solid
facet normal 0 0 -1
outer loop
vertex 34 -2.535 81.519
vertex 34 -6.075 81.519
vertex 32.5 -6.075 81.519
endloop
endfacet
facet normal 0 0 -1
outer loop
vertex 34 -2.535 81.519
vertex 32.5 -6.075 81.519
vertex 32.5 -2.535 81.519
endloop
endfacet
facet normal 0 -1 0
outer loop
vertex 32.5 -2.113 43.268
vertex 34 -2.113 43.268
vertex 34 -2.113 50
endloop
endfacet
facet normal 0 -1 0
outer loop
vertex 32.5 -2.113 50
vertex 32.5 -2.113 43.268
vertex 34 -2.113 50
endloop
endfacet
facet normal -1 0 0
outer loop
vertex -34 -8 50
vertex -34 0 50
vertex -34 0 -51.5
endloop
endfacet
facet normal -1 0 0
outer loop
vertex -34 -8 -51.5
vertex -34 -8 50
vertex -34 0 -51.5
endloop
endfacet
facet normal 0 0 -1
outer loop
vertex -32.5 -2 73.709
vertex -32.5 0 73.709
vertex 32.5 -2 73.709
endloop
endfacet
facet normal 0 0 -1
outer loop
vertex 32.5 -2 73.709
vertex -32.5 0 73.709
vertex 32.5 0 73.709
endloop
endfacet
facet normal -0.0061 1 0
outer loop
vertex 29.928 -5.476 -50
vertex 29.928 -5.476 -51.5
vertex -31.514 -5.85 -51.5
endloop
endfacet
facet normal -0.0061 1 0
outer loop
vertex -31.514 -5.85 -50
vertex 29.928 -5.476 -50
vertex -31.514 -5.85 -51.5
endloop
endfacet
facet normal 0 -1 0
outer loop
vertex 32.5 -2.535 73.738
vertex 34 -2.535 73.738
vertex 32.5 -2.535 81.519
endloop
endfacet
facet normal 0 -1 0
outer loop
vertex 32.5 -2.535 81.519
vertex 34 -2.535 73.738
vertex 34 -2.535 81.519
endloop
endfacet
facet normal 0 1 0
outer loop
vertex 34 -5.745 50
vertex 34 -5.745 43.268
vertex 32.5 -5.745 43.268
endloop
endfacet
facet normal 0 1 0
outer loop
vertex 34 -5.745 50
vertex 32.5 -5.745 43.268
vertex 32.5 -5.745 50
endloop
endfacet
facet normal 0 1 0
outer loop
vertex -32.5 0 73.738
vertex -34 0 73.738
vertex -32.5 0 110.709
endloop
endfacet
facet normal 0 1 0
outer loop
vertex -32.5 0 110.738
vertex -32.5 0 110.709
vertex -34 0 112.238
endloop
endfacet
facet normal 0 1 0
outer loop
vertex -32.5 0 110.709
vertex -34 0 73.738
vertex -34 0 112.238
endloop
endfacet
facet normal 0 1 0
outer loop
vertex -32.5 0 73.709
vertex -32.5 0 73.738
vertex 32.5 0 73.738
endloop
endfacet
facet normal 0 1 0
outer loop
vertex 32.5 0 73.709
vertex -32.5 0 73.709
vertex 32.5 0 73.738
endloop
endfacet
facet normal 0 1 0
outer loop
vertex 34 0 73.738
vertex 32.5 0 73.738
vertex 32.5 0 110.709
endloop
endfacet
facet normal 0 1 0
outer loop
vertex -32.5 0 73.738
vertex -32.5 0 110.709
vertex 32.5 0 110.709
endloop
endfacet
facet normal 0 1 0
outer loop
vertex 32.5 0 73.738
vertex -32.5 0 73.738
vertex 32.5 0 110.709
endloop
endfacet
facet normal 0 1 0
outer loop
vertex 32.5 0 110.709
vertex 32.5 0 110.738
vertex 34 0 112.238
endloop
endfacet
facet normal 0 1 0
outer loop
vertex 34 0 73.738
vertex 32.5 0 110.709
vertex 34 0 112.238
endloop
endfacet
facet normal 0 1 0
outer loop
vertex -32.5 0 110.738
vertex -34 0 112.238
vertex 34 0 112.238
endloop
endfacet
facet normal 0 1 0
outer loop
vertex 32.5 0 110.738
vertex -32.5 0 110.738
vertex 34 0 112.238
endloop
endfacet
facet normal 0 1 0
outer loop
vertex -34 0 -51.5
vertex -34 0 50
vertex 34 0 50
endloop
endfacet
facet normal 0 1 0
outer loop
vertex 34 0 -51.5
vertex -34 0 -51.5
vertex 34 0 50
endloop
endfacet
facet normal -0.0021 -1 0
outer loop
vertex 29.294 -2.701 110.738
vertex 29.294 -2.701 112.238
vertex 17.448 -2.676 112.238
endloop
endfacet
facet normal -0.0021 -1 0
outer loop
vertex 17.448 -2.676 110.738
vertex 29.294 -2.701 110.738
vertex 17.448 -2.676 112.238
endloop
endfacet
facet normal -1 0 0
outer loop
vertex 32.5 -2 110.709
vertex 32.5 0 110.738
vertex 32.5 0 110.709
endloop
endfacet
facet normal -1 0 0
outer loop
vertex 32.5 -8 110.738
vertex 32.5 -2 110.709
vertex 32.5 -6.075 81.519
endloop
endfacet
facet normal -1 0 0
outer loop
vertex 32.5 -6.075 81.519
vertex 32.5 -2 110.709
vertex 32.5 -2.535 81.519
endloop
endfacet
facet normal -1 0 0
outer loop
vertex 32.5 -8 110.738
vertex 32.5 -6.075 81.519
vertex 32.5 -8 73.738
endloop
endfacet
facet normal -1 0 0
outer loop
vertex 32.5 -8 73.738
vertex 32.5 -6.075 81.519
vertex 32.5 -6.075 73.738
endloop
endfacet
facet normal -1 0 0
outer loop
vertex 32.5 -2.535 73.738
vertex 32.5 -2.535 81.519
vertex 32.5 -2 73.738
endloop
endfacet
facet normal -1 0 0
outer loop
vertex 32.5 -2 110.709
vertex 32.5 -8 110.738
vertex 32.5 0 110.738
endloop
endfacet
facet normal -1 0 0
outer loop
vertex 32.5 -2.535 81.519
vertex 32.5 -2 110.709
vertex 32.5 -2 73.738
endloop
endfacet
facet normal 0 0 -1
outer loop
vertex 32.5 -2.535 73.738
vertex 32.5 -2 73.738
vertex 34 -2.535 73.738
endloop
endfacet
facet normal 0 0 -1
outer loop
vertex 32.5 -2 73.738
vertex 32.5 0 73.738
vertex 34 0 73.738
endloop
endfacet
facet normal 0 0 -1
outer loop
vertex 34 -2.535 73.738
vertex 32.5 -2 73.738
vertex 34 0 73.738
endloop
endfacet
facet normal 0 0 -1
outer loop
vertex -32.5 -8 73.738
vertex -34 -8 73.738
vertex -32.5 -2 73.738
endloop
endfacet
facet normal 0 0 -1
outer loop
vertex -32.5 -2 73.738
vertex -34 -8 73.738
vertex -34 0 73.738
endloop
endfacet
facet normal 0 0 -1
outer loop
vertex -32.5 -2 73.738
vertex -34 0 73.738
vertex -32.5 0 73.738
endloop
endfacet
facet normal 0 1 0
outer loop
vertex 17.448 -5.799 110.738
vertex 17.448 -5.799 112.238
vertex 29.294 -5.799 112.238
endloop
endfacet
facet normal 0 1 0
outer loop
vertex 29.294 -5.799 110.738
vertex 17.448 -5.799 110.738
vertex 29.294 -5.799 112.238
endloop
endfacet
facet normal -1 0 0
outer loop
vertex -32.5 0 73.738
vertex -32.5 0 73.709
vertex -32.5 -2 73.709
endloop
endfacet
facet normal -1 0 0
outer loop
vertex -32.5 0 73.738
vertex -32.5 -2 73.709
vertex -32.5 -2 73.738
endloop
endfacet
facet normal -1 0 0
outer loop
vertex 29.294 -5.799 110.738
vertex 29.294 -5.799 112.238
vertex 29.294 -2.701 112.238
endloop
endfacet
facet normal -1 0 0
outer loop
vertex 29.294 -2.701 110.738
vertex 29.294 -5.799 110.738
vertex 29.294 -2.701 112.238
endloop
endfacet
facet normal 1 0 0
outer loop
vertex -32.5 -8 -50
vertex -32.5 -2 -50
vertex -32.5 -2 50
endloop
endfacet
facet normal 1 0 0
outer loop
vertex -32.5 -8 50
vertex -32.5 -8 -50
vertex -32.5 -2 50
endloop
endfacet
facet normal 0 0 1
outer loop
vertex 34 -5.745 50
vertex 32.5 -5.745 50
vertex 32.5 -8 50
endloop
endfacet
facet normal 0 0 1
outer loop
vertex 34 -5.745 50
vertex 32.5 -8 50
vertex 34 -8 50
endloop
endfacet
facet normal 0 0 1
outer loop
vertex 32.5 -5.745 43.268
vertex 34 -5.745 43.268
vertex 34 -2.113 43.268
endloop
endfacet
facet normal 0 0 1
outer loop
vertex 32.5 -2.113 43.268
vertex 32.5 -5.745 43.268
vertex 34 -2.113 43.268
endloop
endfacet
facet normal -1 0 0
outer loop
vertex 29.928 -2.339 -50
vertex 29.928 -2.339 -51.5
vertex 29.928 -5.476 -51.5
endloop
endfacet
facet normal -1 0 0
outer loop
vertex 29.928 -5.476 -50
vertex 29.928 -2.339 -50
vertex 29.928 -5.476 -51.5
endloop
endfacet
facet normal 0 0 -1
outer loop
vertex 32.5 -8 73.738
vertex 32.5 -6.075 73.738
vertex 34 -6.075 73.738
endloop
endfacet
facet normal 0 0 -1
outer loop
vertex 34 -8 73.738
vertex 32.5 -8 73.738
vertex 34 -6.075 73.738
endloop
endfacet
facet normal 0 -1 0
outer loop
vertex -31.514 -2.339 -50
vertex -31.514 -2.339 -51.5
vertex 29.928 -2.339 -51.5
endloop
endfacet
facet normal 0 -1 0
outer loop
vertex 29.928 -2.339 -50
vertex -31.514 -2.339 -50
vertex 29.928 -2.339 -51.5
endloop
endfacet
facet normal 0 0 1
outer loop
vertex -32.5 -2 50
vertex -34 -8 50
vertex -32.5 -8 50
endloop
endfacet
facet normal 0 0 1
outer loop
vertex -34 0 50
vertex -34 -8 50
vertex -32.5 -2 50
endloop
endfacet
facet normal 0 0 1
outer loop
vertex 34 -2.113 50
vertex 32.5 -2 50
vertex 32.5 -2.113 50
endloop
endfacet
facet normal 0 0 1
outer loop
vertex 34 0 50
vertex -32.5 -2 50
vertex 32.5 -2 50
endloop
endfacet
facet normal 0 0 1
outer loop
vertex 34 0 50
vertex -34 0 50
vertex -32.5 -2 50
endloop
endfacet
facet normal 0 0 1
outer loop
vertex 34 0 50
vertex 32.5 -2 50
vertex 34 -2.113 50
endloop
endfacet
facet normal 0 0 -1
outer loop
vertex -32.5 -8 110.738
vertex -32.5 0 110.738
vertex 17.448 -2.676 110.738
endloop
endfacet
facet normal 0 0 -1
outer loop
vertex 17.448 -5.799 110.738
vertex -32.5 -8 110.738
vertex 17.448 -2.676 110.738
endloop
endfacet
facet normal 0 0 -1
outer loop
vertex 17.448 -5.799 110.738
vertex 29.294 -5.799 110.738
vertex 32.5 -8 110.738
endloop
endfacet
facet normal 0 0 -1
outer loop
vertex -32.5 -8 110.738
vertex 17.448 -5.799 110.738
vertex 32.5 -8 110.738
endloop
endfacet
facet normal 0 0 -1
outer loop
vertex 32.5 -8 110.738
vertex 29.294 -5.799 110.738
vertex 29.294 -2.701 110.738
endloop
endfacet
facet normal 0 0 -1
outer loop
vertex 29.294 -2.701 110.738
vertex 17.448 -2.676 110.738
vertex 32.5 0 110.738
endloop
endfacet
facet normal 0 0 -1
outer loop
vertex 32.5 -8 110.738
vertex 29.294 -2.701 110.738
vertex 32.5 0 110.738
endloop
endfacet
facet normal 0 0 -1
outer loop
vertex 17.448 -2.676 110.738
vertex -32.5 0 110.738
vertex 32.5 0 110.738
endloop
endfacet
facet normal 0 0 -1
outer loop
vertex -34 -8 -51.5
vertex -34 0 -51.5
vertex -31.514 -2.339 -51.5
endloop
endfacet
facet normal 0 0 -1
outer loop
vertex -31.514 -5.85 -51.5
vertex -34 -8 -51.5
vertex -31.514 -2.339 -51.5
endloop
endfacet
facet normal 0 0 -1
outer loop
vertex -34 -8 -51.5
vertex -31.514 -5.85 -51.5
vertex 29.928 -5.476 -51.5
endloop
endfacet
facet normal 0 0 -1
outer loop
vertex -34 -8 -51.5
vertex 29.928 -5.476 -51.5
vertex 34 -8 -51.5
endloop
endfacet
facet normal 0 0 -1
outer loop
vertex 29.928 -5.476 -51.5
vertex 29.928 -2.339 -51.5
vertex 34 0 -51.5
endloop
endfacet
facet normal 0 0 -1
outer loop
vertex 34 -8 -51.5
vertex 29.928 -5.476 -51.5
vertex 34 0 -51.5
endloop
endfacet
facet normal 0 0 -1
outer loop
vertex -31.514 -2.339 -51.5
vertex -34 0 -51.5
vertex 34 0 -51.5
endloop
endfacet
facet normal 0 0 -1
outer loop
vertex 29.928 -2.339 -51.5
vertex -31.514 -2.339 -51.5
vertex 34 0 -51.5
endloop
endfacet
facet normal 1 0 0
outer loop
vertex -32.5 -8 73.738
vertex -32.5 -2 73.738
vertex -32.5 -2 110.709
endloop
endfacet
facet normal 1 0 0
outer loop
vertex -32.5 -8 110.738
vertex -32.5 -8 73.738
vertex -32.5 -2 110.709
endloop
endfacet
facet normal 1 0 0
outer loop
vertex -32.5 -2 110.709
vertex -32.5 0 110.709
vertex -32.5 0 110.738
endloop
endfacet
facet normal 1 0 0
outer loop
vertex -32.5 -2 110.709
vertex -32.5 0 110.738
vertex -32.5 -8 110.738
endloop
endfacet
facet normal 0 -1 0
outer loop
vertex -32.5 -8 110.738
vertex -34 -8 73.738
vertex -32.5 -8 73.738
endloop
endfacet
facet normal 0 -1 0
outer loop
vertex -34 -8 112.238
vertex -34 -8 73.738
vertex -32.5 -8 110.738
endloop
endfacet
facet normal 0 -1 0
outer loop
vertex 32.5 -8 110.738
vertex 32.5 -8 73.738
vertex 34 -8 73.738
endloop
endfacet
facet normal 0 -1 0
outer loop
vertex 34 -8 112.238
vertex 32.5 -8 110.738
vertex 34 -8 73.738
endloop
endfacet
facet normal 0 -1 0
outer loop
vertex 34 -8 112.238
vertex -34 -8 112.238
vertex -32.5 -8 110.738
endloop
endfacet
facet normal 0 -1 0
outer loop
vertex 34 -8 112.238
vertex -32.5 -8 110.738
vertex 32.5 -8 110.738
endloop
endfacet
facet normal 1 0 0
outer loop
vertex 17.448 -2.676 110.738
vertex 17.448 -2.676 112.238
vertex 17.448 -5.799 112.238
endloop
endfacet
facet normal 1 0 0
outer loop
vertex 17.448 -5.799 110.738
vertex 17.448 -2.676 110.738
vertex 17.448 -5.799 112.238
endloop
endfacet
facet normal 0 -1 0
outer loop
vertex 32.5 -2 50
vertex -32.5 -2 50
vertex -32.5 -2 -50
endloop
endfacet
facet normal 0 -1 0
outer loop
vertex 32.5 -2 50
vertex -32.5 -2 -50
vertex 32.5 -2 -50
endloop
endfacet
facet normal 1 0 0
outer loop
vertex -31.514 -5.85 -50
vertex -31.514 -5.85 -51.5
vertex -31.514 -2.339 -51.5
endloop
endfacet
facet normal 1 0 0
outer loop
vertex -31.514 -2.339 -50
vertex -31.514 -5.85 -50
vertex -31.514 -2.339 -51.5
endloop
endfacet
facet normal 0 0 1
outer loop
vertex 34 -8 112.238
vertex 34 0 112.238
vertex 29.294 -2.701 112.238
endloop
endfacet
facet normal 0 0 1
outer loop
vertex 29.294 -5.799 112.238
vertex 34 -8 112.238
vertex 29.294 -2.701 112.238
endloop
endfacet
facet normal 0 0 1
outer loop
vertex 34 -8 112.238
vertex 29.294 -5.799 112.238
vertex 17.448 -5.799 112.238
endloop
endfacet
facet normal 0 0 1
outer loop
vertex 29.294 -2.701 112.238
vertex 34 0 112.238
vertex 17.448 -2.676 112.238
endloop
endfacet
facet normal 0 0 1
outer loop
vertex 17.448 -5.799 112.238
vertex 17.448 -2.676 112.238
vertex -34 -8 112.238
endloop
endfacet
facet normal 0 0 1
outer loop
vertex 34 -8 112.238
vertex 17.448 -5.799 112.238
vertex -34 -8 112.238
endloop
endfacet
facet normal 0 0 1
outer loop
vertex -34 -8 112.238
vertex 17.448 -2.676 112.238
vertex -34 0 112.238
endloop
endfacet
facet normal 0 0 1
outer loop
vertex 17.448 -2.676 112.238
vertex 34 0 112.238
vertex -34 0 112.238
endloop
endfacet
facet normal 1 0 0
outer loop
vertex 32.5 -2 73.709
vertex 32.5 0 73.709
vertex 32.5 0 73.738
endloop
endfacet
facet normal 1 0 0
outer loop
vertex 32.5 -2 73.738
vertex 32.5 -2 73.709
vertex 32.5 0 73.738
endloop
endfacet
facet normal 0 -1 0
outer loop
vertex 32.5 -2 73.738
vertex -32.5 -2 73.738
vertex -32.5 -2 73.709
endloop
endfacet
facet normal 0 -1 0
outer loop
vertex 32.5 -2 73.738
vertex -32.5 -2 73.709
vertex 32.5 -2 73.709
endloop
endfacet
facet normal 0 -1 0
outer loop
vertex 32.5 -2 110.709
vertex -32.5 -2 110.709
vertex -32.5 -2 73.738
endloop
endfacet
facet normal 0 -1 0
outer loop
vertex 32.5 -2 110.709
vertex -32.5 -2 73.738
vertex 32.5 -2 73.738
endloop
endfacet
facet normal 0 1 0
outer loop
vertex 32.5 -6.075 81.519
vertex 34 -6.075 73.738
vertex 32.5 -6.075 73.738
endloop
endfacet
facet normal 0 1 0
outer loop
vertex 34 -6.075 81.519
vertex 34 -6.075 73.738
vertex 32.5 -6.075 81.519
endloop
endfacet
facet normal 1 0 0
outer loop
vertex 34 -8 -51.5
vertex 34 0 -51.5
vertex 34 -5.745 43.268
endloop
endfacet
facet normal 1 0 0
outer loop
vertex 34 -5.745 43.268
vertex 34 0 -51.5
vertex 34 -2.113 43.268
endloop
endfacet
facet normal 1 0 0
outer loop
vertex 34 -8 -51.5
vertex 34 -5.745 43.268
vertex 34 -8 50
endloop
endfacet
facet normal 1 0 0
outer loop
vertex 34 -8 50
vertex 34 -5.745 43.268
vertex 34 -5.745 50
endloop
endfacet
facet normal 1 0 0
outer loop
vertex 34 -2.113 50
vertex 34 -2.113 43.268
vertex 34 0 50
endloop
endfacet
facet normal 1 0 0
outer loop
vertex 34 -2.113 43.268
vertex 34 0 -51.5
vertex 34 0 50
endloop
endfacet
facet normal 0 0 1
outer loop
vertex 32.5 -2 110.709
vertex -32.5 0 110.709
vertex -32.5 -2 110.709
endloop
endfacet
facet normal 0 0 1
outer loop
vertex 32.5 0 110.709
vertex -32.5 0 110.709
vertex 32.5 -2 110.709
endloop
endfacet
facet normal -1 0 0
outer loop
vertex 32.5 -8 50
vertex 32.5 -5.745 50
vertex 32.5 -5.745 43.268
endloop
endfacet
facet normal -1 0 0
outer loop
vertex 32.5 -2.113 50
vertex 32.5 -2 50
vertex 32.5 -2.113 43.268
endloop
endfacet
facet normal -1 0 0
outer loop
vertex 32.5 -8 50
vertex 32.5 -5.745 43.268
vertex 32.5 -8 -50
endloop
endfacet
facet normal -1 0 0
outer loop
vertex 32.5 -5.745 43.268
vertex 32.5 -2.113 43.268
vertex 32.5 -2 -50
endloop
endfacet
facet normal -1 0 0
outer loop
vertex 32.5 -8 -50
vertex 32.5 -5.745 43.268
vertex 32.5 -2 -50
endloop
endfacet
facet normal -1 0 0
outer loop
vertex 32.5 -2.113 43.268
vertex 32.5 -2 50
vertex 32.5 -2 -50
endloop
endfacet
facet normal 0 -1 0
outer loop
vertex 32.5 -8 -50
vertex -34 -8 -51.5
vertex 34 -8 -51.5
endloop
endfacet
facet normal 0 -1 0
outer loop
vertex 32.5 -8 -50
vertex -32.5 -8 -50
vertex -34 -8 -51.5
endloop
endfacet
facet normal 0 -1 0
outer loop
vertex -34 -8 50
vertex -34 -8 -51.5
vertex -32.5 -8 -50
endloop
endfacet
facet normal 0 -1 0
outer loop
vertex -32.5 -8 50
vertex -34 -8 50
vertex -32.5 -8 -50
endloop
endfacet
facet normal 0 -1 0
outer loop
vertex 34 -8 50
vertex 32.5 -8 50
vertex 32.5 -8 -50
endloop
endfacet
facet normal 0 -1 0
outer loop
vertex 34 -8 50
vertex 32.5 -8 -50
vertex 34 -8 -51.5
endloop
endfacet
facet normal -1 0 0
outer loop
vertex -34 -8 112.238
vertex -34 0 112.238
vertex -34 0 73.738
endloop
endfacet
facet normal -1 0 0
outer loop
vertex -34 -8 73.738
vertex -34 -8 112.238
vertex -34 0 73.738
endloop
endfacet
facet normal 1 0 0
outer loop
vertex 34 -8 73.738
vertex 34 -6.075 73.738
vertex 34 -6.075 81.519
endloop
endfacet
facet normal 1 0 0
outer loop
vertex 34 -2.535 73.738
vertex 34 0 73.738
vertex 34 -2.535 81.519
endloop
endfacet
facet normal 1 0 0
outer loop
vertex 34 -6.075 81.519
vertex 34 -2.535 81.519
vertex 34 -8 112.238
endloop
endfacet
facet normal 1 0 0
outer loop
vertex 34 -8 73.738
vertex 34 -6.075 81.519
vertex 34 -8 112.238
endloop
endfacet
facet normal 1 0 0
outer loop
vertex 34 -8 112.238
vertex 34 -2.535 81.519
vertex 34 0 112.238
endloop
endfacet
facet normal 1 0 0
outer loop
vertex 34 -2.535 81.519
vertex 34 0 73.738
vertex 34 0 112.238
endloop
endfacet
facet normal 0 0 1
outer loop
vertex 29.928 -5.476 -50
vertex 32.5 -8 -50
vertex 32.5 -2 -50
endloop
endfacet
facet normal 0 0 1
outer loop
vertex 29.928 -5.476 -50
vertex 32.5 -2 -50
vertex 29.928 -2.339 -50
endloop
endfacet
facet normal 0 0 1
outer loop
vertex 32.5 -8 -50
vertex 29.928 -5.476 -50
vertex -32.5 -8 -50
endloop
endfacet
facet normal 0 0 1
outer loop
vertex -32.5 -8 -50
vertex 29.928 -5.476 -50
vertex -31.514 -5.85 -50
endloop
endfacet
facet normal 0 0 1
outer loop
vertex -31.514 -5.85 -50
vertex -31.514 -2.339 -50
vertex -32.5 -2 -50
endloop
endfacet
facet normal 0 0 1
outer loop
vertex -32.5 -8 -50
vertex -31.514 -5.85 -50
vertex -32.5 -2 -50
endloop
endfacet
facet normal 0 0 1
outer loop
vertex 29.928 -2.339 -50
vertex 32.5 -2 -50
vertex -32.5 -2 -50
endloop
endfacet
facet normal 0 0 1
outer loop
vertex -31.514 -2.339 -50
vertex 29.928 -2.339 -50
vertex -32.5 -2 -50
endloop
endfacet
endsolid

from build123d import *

# Parameters (mm, degrees)
F1_DEPTH  = 8
F2_W      = 65
F2_H      = 100
F3_DEPTH  = 2
F4_W      = 65
F4_H      = 37
F5_DEPTH  = 2
F7_DEPTH  = 1.5
F9_DEPTH  = 1.5
F10_W     = 3.540316131
F10_H     = 7.7811924219
F11_DEPTH = 1.5
F12_W     = 3.6324255634
F12_H     = 6.7319788039
F13_DEPTH = 1.5


with BuildPart() as f1:
    # F0 (on Front) → F1 (new body)
    with BuildSketch(Plane.XZ):
        Polygon((32.5, 110.737599194), (32.5, 73.737599194), (34, 73.737599194), (34, 112.237599194), (-34, 112.237599194), (-34, 73.737599194), (-32.5, 73.737599194), (-32.5, 110.737599194), align=None)
    extrude(amount=F1_DEPTH)

    # F4 (on Front) → F5 (join)
    with BuildSketch(Plane.XZ):
        with Locations((0, 92.2091004848)):
            Rectangle(F4_W, F4_H)
    extrude(amount=F5_DEPTH)

    # F8 (on face) → F9 (cut)
    with BuildSketch(Plane.XY.offset(112.237599194)):
        Polygon((29.2936004698, -2.7011381462), (17.4477100372, -2.6758047752), (17.4477100372, -5.7993703522), (29.2936004698, -5.7993703522), align=None)
    extrude(amount=-F9_DEPTH, mode=Mode.SUBTRACT)

    # F10 (on face) → F11 (cut)
    with BuildSketch(Plane.YZ.offset(34)):
        with Locations((-4.3051776011, 77.628195405)):
            Rectangle(F10_W, F10_H)
    extrude(amount=-F11_DEPTH, mode=Mode.SUBTRACT)


with BuildPart() as f1b:
    # F0 (on Front) → F1, piece 2 (new body)
    with BuildSketch(Plane.XZ):
        Polygon((34, 50), (32.5, 50), (32.5, -50), (-32.5, -50), (-32.5, 50), (-34, 50), (-34, -51.5), (34, -51.5), align=None)
    extrude(amount=F1_DEPTH)

    # F2 (on Front) → F3 (join)
    with BuildSketch(Plane.XZ):
        Rectangle(F2_W, F2_H)
    extrude(amount=F3_DEPTH)

    # F6 (on face) → F7 (cut)
    with BuildSketch(Plane(origin=(0, 0, -51.5), x_dir=(1, 0, 0), z_dir=(0, 0, -1))):
        Polygon((29.9283172935, 5.4762815125), (-31.5138846636, 5.850112997), (-31.5138846636, 2.3388296831), (29.9283172935, 2.3388296831), align=None)
    extrude(amount=-F7_DEPTH, mode=Mode.SUBTRACT)

    # F12 (on face) → F13 (cut)
    with BuildSketch(Plane.YZ.offset(34)):
        with Locations((-3.9292465663, 46.6340105981)):
            Rectangle(F12_W, F12_H)
    extrude(amount=-F13_DEPTH, mode=Mode.SUBTRACT)


solid = Compound([f1.part, f1b.part])
